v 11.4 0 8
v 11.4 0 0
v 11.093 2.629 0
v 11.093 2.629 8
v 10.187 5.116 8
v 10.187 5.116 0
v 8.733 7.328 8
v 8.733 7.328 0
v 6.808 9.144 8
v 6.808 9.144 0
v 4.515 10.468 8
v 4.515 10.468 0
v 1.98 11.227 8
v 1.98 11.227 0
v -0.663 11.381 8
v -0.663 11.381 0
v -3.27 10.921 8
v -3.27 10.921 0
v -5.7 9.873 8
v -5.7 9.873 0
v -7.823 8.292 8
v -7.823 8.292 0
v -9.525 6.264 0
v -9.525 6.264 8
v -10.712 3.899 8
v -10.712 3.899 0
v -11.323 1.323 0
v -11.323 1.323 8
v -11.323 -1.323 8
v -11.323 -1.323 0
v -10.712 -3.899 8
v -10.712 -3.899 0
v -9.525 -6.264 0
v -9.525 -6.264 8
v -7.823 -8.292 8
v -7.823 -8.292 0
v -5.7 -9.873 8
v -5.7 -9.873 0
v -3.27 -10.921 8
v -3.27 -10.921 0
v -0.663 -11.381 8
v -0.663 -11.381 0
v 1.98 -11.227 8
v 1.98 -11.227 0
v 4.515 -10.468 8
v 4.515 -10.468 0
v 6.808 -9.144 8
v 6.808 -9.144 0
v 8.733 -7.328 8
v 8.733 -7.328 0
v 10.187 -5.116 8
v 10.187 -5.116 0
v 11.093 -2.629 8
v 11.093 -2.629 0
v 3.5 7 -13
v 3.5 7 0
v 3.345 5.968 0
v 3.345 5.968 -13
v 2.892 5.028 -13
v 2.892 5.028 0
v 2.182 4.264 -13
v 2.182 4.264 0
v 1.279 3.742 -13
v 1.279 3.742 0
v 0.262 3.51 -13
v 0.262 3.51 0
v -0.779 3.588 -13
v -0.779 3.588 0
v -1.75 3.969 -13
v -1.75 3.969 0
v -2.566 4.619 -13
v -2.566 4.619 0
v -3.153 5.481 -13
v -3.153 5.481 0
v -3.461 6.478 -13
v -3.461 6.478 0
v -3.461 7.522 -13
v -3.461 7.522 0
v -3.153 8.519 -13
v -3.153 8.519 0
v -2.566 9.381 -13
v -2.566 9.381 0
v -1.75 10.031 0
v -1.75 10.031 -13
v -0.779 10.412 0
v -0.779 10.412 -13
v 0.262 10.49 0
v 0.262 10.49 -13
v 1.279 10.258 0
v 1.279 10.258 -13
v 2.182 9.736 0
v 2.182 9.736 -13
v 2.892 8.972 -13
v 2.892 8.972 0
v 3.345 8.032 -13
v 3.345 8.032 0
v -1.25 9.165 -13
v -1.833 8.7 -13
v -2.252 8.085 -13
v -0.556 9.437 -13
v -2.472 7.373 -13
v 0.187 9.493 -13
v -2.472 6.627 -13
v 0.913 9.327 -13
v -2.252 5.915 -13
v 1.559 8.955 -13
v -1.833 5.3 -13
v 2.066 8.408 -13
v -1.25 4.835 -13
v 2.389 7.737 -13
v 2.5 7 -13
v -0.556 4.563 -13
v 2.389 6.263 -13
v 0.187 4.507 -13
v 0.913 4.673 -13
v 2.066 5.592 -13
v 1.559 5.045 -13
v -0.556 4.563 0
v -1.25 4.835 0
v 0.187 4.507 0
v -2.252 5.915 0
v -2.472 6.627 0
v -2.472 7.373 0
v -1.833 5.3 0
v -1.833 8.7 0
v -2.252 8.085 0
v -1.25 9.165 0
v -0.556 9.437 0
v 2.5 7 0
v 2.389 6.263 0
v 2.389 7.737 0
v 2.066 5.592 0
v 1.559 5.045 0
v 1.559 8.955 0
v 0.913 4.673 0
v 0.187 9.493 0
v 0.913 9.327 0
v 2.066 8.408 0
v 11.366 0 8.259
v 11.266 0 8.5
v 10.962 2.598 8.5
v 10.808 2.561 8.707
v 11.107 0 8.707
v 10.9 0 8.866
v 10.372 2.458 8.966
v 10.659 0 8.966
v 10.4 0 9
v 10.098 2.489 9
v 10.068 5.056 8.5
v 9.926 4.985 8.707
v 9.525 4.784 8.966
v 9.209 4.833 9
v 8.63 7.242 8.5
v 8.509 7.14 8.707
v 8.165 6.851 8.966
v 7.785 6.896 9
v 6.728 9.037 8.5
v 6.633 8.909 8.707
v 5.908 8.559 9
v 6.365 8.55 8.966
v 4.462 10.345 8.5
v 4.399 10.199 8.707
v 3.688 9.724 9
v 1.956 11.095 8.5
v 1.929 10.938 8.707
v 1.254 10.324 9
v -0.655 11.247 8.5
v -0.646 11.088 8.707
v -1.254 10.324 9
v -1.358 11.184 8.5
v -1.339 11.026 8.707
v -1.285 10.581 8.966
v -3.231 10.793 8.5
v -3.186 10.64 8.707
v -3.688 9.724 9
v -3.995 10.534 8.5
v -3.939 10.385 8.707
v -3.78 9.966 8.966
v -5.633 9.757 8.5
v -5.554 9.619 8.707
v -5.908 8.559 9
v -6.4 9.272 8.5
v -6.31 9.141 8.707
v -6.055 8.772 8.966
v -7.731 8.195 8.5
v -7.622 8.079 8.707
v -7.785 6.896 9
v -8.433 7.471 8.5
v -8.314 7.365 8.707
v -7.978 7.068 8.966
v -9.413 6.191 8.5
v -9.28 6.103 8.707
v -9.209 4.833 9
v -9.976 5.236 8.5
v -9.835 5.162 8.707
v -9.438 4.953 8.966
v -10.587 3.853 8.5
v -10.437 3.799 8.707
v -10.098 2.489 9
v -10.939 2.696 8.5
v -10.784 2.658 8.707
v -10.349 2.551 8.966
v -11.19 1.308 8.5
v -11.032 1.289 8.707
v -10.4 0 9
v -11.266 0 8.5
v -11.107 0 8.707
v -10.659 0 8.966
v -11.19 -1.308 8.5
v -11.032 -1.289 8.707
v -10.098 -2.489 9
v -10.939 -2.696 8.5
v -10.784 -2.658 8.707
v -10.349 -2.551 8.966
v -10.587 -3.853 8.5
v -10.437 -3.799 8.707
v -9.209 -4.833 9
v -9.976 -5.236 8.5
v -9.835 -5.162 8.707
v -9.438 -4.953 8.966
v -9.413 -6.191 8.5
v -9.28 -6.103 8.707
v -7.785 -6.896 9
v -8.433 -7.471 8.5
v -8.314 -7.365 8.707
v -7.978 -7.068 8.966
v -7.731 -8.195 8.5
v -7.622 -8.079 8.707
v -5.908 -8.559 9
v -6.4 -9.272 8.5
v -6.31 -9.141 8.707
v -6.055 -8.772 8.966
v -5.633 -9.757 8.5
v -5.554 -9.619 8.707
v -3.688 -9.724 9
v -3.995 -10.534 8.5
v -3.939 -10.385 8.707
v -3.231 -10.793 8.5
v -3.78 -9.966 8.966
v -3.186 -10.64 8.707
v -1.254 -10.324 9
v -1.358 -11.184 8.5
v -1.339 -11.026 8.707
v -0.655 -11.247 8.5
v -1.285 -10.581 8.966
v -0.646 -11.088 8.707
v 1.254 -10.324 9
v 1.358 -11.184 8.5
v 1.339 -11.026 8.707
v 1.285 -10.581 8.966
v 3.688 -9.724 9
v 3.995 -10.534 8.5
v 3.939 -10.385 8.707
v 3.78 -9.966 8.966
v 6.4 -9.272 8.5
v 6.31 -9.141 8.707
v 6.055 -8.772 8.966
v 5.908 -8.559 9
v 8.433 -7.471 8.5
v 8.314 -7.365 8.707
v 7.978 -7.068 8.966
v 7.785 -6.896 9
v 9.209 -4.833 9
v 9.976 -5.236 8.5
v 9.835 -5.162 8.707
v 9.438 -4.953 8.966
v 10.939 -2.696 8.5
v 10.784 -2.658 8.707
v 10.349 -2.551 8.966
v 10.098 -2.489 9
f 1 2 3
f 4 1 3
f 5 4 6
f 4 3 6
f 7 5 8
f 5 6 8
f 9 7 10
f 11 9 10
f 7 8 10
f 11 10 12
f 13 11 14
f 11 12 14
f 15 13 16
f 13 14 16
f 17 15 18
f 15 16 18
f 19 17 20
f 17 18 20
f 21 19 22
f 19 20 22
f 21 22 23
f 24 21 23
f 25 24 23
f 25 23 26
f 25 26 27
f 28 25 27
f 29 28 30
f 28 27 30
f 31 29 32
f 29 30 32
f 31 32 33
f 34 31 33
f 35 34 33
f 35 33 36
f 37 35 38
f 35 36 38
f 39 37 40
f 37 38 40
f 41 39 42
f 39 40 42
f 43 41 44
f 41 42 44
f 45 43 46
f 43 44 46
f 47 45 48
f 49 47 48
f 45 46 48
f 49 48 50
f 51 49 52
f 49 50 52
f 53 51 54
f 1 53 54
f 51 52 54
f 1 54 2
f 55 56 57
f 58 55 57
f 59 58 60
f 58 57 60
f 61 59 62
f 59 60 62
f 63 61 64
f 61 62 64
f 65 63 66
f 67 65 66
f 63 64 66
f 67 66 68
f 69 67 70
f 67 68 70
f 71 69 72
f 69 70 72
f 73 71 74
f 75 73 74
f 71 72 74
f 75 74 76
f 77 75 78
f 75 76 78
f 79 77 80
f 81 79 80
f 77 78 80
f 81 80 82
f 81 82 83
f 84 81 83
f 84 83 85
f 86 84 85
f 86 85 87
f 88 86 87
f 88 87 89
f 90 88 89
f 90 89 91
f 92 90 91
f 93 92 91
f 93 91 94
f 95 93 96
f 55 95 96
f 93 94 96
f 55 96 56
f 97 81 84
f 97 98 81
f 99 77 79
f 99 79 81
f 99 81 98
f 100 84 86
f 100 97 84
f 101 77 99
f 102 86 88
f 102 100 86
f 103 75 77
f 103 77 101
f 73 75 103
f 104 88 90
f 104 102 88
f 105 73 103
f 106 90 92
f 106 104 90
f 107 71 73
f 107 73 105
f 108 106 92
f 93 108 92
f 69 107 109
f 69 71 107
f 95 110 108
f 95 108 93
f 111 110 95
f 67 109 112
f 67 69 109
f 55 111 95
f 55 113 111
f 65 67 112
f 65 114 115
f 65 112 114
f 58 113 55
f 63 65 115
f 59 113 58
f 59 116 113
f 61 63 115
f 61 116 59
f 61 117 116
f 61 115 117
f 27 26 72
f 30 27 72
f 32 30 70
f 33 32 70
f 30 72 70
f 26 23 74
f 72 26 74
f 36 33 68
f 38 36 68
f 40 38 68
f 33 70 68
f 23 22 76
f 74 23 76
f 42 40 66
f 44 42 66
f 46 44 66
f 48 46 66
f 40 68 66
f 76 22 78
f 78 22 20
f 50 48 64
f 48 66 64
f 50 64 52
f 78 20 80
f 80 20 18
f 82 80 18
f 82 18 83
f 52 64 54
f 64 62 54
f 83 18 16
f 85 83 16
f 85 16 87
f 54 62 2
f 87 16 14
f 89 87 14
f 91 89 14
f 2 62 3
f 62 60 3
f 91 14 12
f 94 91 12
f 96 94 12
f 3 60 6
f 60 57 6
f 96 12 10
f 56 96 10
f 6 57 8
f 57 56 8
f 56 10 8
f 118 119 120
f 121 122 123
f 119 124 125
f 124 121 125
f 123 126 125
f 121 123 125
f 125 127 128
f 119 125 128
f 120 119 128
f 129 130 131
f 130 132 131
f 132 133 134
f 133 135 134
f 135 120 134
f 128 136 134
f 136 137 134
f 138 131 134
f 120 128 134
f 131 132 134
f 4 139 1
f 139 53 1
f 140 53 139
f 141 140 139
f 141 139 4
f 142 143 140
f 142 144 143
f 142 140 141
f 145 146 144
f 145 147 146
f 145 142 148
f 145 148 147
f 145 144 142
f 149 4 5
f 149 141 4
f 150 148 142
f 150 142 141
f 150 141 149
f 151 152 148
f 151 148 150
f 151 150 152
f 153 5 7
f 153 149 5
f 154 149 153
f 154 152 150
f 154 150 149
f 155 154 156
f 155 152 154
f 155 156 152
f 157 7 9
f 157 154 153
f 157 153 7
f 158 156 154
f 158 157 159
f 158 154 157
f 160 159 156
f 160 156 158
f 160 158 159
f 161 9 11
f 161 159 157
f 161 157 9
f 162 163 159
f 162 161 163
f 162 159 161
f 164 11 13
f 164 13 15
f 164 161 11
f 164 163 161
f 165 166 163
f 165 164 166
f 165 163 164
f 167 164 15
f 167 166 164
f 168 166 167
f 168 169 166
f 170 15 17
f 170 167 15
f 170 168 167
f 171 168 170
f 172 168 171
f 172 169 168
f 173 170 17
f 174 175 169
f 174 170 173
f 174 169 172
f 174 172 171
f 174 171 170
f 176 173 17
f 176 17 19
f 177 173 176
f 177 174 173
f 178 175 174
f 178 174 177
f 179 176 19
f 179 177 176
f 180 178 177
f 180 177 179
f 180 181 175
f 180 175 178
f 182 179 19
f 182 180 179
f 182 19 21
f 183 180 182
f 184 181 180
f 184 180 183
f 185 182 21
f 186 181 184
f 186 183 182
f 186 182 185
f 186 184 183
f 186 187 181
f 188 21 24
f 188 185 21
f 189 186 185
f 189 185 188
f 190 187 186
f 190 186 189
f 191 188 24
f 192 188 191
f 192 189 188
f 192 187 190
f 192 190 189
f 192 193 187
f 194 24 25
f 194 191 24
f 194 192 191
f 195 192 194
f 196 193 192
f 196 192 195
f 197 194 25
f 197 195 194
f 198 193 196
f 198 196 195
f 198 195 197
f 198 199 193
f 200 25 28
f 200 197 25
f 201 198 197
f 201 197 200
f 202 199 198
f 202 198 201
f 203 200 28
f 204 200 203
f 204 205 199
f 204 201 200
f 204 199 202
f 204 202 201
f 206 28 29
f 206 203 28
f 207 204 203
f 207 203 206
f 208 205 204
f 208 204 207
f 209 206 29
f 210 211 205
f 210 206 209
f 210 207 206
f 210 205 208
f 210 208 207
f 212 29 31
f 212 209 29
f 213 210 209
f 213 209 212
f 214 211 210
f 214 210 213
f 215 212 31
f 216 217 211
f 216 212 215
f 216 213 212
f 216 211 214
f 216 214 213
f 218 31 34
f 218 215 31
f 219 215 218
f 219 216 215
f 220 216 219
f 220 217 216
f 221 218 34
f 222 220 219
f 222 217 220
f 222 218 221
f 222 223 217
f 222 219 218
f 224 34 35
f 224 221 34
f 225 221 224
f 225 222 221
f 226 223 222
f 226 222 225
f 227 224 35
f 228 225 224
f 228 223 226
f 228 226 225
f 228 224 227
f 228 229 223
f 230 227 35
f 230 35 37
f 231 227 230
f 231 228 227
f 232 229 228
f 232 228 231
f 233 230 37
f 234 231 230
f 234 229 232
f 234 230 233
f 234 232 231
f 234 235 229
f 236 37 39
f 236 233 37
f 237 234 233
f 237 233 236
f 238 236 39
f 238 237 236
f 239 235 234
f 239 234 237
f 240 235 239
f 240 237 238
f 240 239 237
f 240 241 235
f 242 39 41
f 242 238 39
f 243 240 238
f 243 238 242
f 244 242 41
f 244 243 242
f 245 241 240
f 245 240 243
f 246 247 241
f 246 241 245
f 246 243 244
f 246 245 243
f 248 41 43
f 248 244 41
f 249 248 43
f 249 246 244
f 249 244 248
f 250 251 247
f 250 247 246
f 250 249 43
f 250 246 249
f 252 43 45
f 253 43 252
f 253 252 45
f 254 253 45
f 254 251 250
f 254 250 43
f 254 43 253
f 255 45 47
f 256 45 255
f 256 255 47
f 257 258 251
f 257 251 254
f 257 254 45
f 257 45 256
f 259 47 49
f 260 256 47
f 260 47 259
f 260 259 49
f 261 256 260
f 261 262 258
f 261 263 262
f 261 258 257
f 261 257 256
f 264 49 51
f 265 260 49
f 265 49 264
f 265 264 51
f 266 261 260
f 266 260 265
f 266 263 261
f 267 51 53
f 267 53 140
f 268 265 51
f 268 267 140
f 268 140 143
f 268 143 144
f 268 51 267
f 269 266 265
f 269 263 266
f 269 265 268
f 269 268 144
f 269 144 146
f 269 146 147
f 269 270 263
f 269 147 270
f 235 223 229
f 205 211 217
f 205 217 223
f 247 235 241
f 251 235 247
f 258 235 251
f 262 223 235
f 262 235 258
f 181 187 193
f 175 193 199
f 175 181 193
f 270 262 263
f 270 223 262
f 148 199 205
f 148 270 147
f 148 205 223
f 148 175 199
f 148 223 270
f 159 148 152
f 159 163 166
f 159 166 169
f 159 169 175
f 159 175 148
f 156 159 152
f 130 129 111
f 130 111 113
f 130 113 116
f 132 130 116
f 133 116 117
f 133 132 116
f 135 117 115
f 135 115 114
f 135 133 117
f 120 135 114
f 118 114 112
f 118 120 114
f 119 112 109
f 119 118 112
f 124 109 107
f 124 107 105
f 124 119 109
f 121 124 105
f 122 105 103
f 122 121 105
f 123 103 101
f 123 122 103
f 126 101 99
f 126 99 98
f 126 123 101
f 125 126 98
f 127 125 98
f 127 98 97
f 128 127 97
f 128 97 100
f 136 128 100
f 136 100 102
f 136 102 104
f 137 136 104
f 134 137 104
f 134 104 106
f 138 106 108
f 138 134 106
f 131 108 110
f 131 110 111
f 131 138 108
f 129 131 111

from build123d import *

# Parameters (mm, degrees)
F0_R     = 11.4
F1_DEPTH = 9
F2_R     = 3.5
F2_R_2   = 2.5
F3_DEPTH = 13
F4_R     = 1


with BuildPart() as f1:
    # F0 (on Top) → F1 (new body)
    with BuildSketch(Plane.XY):
        Circle(F0_R)
    extrude(amount=F1_DEPTH)

    # F2 (on face) → F3 (join)
    with BuildSketch(Plane(origin=(0, 0, 0), x_dir=(1, 0, 0), z_dir=(0, 0, -1))):
        with Locations((0, -7)):
            Circle(F2_R)
        with Locations((0, -7)):
            Circle(F2_R_2, mode=Mode.SUBTRACT)
    extrude(amount=F3_DEPTH)

    # F4
    f4_edges = [f1.edges().sort_by_distance(p)[0] for p in [
        (-11.4, 0, 9),
    ]]
    fillet(f4_edges, radius=F4_R)


solid = f1.part
